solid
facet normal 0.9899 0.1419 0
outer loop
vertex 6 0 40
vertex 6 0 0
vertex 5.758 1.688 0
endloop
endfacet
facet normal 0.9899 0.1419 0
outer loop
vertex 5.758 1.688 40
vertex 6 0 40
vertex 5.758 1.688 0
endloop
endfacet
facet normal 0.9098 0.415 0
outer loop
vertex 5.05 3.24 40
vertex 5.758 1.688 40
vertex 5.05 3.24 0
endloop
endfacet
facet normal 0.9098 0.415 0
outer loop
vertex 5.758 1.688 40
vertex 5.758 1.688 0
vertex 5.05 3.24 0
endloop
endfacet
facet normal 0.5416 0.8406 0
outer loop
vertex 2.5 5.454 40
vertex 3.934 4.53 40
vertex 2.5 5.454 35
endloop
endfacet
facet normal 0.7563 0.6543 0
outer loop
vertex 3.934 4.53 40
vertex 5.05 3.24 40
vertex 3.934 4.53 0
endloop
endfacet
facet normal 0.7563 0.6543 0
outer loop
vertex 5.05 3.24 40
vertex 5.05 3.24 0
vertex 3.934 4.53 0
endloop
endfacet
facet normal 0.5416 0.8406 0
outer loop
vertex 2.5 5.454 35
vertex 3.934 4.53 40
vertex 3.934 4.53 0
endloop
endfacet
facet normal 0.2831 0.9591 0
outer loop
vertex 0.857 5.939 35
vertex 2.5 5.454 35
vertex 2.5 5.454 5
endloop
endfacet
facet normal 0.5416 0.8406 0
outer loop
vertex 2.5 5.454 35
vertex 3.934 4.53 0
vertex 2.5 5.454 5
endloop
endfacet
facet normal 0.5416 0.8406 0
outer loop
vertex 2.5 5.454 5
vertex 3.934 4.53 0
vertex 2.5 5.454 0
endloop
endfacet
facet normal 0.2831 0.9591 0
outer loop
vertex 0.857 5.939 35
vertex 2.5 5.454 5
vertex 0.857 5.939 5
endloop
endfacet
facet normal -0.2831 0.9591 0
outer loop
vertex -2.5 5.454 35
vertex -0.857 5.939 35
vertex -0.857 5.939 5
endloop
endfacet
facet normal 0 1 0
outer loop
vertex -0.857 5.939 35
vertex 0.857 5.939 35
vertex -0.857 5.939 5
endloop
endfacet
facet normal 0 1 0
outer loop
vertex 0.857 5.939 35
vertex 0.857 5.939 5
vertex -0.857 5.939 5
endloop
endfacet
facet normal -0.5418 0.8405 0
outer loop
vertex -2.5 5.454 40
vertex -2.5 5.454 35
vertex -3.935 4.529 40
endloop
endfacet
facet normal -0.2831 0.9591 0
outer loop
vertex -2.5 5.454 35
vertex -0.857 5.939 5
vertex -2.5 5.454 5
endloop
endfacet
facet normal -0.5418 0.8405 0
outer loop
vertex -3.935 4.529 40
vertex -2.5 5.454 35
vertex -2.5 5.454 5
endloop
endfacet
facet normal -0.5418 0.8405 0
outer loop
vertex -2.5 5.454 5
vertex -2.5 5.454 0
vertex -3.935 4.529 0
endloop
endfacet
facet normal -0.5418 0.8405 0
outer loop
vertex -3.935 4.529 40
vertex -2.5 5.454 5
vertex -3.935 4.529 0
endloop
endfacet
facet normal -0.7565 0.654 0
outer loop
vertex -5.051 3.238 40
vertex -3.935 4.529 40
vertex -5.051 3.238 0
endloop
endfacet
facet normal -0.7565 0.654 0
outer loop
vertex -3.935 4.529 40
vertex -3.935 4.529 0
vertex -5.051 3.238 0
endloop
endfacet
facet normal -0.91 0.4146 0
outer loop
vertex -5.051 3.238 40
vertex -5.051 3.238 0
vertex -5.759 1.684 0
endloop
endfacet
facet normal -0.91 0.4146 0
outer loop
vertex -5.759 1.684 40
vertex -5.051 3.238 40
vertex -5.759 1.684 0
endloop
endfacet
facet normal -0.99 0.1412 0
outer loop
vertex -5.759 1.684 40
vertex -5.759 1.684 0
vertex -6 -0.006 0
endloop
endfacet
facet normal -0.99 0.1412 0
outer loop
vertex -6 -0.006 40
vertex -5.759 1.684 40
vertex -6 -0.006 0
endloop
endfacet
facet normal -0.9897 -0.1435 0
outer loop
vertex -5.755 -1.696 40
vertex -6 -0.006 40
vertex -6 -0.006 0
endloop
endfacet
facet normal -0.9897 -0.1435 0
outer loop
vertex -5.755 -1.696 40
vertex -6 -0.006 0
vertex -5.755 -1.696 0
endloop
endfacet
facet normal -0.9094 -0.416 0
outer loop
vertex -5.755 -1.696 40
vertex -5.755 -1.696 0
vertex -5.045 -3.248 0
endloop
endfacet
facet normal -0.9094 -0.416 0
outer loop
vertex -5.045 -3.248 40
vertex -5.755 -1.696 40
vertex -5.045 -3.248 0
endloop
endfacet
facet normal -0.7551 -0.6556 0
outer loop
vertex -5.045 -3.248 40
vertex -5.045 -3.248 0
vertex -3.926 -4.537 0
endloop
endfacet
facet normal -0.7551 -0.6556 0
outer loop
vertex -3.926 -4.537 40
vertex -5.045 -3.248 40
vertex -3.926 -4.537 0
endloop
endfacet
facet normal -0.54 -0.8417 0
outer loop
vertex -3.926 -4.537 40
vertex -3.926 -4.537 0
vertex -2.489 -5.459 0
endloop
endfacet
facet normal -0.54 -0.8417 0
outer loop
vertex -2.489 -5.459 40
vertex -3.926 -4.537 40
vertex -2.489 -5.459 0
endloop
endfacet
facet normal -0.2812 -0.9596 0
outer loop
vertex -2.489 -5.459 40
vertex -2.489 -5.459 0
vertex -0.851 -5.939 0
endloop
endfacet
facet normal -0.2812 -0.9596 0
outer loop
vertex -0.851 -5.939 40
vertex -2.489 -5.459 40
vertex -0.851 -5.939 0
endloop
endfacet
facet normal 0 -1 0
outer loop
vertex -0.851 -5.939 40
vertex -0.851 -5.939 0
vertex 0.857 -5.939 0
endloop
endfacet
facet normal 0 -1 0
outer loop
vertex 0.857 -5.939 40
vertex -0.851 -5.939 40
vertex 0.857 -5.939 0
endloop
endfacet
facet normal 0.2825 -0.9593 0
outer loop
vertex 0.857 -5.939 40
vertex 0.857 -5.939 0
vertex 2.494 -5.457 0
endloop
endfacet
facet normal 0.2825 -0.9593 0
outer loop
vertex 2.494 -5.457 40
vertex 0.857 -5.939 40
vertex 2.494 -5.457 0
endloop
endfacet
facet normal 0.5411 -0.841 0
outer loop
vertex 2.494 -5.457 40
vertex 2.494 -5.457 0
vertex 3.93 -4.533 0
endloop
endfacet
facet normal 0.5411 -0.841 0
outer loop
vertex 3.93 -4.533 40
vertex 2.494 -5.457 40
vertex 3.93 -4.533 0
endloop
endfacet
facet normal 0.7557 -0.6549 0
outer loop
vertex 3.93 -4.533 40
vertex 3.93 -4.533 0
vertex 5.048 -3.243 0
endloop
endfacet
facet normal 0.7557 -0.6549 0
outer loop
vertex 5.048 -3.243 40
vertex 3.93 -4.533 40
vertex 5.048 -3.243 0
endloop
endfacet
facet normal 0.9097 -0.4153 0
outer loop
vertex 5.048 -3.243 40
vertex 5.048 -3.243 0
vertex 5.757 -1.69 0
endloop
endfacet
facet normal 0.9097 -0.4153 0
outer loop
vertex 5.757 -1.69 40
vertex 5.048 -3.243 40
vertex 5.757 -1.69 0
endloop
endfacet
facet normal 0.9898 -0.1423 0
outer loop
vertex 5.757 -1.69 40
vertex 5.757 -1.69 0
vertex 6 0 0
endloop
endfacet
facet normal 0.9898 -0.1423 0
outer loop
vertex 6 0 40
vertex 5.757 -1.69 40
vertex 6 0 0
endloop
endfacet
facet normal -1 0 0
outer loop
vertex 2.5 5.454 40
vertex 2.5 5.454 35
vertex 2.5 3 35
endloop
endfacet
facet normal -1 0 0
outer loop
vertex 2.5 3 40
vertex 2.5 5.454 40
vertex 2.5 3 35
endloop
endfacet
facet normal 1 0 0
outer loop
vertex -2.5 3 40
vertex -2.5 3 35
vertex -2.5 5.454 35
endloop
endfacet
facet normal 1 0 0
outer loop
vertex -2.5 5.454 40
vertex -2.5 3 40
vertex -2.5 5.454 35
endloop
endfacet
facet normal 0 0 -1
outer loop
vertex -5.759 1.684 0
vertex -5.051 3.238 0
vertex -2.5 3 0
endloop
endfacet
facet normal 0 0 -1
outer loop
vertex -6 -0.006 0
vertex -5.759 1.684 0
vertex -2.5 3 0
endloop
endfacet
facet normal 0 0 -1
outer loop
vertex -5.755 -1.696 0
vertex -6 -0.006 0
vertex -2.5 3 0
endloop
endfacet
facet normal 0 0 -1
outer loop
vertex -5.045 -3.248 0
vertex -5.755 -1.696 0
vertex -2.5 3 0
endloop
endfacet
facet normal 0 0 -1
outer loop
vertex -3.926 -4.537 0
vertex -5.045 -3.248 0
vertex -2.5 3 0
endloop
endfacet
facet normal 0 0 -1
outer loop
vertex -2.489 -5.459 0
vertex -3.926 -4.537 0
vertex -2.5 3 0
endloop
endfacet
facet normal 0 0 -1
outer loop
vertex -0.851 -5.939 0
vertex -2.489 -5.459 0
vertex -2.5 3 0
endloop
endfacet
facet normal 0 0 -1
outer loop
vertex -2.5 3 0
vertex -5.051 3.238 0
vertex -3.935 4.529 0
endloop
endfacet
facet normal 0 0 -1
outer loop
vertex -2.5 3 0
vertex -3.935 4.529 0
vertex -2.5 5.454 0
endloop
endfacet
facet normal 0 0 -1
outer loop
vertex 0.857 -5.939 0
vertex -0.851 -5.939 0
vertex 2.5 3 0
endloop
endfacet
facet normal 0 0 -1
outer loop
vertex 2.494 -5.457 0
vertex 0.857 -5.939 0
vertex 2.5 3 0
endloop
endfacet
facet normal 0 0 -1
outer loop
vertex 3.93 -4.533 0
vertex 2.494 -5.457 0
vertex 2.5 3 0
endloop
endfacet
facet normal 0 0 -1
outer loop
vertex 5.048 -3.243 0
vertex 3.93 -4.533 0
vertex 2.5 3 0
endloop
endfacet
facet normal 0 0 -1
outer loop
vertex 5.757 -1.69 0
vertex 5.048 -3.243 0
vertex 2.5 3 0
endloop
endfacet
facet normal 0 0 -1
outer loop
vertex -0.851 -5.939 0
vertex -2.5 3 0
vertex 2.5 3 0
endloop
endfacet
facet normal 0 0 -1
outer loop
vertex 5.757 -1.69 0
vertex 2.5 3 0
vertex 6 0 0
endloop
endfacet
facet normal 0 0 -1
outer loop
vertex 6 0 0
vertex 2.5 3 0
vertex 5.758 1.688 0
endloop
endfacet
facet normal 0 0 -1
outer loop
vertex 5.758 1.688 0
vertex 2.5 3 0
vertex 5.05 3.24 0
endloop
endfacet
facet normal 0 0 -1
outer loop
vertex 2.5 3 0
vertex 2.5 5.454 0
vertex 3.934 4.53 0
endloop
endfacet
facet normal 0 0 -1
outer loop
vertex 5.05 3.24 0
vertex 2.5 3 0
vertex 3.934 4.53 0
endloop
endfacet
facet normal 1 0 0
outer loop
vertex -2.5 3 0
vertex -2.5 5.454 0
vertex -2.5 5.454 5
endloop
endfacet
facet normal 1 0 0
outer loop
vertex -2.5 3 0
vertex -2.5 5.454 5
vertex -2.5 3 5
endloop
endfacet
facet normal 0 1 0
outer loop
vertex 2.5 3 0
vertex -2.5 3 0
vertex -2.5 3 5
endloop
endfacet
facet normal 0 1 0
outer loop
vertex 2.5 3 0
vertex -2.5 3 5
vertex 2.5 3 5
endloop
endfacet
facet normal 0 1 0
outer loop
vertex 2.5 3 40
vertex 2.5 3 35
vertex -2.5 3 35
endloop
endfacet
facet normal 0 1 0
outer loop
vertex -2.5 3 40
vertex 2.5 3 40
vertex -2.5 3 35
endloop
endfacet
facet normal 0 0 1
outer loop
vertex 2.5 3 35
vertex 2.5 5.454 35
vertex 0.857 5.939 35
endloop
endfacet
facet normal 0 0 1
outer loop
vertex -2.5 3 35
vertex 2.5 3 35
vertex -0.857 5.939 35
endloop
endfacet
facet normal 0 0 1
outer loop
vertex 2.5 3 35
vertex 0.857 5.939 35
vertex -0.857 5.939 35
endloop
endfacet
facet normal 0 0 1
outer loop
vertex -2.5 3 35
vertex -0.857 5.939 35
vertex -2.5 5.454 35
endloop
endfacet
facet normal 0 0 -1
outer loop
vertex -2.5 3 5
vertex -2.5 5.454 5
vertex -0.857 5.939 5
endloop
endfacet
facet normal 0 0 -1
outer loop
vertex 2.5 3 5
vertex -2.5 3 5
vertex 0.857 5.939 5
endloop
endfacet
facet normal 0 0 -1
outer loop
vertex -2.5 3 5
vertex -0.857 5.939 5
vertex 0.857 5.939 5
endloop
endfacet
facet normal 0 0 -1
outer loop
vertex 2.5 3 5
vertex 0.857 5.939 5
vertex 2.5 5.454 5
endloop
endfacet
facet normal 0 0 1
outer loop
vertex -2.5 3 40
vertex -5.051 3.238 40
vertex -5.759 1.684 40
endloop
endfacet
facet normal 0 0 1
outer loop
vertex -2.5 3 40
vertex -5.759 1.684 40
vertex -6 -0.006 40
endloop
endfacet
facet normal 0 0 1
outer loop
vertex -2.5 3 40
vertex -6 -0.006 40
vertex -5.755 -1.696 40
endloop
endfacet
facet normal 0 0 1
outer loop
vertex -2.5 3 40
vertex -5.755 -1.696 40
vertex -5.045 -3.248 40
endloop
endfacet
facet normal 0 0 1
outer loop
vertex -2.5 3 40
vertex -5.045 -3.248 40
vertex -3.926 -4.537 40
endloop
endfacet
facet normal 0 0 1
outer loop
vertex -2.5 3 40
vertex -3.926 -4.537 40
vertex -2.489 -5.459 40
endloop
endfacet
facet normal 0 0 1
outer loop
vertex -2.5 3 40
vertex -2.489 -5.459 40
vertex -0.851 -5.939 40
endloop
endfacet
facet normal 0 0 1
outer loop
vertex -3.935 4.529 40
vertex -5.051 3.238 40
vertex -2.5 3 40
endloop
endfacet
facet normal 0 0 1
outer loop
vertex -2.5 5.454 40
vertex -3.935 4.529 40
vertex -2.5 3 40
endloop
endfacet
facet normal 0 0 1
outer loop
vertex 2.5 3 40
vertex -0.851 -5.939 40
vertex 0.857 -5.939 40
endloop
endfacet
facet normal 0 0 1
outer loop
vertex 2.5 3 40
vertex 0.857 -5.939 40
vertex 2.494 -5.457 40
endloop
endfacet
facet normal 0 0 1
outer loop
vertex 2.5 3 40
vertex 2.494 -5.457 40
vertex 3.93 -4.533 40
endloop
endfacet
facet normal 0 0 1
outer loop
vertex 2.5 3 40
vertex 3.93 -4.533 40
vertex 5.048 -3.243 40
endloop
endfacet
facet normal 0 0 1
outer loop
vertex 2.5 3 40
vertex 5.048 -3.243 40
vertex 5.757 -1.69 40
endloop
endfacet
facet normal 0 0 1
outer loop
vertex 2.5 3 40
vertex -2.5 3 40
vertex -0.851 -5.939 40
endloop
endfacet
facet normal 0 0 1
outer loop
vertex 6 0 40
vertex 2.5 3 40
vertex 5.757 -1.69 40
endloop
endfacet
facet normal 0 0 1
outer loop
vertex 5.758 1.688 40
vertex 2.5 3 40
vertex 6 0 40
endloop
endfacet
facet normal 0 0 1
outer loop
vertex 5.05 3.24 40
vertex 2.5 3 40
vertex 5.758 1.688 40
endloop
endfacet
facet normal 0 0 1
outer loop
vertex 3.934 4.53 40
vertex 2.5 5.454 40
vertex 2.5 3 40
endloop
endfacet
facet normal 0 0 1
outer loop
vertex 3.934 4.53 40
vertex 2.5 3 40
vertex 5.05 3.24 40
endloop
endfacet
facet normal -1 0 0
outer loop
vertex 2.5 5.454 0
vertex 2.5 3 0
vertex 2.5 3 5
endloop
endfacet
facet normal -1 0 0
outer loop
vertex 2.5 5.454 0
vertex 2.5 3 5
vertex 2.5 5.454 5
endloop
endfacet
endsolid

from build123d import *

# Parameters (mm, degrees)
SKETCH_1_R          = 6
EXTRUDE_1_DEPTH     = 40
CUT_EXTRUDE_START   = -5
CUT_EXTRUDE_1_DEPTH = 5
CUT_EXTRUDE_2_DEPTH = 5


with BuildPart() as part:
    # 草图1 → 凸台-拉伸1 (new body)
    with BuildSketch(Plane.XY):
        Circle(SKETCH_1_R)
    extrude(amount=EXTRUDE_1_DEPTH)

    # 草图2 → 切除-拉伸1 (cut)
    with BuildSketch(Plane.XY.offset(40).offset(CUT_EXTRUDE_START)):
        with BuildLine():
            Line((2.5, 3), (-2.5, 3))
            Line((-2.5, 3), (-2.5, 5.454356057))
            ThreePointArc((-2.5, 5.454356057), (0, 6), (2.5, 5.454356057))
            Line((2.5, 5.454356057), (2.5, 3))
        make_face()
    extrude(amount=CUT_EXTRUDE_1_DEPTH, mode=Mode.SUBTRACT)

    # 草图3 → 切除-拉伸2 (cut)
    with BuildSketch(Plane(origin=(0, 0, 0), x_dir=(-1, 0, 0), z_dir=(0, 0, -1))):
        with BuildLine():
            Line((2.5, 3), (-2.5, 3))
            Line((-2.5, 3), (-2.5, 5.454356057))
            ThreePointArc((-2.5, 5.454356057), (0, 6), (2.5, 5.454356057))
            Line((2.5, 5.454356057), (2.5, 3))
        make_face()
    extrude(amount=-CUT_EXTRUDE_2_DEPTH, mode=Mode.SUBTRACT)


solid = part.part
